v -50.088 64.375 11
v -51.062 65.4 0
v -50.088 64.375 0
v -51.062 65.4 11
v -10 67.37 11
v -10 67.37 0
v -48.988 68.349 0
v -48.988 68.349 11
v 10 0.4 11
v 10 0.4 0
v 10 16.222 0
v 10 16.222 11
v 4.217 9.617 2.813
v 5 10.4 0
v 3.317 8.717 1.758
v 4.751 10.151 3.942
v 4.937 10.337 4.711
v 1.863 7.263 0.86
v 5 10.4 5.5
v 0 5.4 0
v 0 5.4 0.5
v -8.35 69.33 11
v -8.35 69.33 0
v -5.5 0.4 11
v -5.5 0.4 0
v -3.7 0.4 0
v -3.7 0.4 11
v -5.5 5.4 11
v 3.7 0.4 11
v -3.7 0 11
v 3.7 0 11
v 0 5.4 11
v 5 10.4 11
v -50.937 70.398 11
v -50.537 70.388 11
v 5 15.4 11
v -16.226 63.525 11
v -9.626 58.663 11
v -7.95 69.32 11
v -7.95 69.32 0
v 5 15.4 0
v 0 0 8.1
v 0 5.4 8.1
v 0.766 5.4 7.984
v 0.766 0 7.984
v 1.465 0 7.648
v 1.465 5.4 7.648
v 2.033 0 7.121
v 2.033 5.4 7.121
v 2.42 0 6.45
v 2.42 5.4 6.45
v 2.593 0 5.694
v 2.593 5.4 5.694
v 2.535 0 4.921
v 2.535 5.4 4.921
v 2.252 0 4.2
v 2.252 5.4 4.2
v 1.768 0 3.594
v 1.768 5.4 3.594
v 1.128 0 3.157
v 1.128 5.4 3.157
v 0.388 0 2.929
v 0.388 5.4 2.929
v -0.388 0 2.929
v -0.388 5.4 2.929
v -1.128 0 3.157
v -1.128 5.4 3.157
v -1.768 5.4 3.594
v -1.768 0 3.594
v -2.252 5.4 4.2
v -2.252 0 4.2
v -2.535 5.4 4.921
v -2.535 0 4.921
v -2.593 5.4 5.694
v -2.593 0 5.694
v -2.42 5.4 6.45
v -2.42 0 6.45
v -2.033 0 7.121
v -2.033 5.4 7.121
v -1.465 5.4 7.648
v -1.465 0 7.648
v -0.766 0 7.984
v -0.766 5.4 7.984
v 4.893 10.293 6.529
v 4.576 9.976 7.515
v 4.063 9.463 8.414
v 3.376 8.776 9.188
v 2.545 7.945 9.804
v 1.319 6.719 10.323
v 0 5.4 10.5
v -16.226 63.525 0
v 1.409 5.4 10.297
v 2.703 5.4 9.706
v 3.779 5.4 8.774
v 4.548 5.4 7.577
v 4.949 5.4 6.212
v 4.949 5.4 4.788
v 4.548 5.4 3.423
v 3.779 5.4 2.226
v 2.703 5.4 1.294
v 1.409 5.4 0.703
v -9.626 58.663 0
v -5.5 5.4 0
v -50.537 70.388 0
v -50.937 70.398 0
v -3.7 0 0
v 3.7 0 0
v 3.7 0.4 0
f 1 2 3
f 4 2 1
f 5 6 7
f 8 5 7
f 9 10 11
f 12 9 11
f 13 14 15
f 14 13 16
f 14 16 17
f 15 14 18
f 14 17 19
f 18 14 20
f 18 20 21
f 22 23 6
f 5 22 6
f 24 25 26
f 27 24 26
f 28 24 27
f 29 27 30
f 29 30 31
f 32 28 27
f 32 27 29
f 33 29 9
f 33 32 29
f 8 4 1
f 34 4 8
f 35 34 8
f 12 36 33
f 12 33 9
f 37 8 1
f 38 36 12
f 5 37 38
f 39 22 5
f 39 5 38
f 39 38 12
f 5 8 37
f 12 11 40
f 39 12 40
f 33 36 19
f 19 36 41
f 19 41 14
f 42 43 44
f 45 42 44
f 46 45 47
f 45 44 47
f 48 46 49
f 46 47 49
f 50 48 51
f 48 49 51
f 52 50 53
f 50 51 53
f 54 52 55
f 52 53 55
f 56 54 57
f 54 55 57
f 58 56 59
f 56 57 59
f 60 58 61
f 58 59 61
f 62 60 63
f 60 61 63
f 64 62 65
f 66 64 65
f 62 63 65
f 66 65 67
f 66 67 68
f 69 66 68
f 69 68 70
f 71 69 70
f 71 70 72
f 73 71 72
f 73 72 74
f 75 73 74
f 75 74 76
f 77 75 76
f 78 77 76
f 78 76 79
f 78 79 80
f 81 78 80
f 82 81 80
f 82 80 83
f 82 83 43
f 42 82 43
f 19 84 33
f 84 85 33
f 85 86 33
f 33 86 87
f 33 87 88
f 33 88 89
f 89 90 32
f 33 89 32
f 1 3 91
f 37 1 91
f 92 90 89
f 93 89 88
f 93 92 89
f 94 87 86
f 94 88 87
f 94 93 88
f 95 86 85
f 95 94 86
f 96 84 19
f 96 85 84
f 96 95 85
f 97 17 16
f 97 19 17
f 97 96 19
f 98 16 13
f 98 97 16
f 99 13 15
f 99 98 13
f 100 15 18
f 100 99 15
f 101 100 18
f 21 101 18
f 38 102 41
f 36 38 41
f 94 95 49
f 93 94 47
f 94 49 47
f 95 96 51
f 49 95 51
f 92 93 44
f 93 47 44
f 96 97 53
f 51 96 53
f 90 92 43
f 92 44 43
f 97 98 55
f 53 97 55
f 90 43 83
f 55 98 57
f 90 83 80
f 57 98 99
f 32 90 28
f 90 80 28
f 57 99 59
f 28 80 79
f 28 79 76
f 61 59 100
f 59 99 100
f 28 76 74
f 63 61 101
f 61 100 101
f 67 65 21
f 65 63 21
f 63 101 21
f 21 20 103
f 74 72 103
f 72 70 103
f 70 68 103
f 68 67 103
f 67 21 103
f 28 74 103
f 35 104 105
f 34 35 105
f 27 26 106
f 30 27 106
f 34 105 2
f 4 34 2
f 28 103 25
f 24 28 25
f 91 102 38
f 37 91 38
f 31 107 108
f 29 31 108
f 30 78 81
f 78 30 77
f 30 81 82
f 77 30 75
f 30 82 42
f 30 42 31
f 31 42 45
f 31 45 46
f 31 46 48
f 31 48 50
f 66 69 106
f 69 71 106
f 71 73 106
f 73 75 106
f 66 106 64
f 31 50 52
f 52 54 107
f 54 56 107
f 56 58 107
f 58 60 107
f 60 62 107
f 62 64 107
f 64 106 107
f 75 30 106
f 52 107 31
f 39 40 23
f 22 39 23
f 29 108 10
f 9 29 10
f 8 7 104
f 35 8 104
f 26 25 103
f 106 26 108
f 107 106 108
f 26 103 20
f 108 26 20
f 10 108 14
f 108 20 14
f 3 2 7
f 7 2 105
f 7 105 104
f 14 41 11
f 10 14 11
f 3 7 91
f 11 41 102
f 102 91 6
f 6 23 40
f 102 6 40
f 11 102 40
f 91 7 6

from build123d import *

# Parameters (mm, degrees)
EXTRUDE_1_DEPTH     = 11
CHAMFER_2_SIZE      = 5
CHAMFER_3_SIZE      = 1
SKETCH_2_R          = 2.6
CUT_EXTRUDE_1_DEPTH = 84.385355554
SKETCH_3_R          = 5
CUT_EXTRUDE_2_DEPTH = 5


with BuildPart() as part:
    # Эскиз1 → Бобышка-Вытянуть1 (new body)
    with BuildSketch(Plane.XY):
        Polygon((-5.5, 0.4), (-3.7, 0.4), (-3.7, 0), (3.7, 0), (3.7, 0.4), (10, 0.4), (10, 16.222307726), (-7.950469523, 69.319681931), (-8.350343704, 69.329713846), (-10, 67.370470597), (-48.987732655, 68.348582239), (-50.537069808, 70.388080802), (-50.93694399, 70.398112716), (-51.087422704, 64.4), (-11.227215564, 63.4), (5, 15.4), (5, 5.4), (-5.5, 5.4), align=None)
    extrude(amount=EXTRUDE_1_DEPTH)

    # Фаска2
    chamfer_2_edges = [part.edges().sort_by_distance(p)[0] for p in [
        (5, 5.4, 5.5),
        (-11.227215564, 63.4, 5.5),
    ]]
    chamfer(chamfer_2_edges, length=CHAMFER_2_SIZE)

    # Фаска3
    chamfer_3_edges = [part.edges().sort_by_distance(p)[0] for p in [
        (-51.087422704, 64.4, 5.5),
    ]]
    chamfer(chamfer_3_edges, length=CHAMFER_3_SIZE)

    # Эскиз2 → Вырез-Вытянуть1 (cut, through all)
    with BuildSketch(Plane(origin=(0, 5.4, 0), x_dir=(1, 0, 0), z_dir=(0, 1, 0))):
        with Locations(Location((0, -5.5, 0), (0, 0, 270))):
            Circle(SKETCH_2_R)
    extrude(amount=-CUT_EXTRUDE_1_DEPTH, mode=Mode.SUBTRACT)

    # Эскиз3 → Вырез-Вытянуть2 (cut)
    with BuildSketch(Plane(origin=(0, 5.4, 0), x_dir=(1, 0, 0), z_dir=(0, 1, 0))):
        with Locations((0, -5.5)):
            Circle(SKETCH_3_R)
    extrude(amount=CUT_EXTRUDE_2_DEPTH, mode=Mode.SUBTRACT)


solid = part.part
